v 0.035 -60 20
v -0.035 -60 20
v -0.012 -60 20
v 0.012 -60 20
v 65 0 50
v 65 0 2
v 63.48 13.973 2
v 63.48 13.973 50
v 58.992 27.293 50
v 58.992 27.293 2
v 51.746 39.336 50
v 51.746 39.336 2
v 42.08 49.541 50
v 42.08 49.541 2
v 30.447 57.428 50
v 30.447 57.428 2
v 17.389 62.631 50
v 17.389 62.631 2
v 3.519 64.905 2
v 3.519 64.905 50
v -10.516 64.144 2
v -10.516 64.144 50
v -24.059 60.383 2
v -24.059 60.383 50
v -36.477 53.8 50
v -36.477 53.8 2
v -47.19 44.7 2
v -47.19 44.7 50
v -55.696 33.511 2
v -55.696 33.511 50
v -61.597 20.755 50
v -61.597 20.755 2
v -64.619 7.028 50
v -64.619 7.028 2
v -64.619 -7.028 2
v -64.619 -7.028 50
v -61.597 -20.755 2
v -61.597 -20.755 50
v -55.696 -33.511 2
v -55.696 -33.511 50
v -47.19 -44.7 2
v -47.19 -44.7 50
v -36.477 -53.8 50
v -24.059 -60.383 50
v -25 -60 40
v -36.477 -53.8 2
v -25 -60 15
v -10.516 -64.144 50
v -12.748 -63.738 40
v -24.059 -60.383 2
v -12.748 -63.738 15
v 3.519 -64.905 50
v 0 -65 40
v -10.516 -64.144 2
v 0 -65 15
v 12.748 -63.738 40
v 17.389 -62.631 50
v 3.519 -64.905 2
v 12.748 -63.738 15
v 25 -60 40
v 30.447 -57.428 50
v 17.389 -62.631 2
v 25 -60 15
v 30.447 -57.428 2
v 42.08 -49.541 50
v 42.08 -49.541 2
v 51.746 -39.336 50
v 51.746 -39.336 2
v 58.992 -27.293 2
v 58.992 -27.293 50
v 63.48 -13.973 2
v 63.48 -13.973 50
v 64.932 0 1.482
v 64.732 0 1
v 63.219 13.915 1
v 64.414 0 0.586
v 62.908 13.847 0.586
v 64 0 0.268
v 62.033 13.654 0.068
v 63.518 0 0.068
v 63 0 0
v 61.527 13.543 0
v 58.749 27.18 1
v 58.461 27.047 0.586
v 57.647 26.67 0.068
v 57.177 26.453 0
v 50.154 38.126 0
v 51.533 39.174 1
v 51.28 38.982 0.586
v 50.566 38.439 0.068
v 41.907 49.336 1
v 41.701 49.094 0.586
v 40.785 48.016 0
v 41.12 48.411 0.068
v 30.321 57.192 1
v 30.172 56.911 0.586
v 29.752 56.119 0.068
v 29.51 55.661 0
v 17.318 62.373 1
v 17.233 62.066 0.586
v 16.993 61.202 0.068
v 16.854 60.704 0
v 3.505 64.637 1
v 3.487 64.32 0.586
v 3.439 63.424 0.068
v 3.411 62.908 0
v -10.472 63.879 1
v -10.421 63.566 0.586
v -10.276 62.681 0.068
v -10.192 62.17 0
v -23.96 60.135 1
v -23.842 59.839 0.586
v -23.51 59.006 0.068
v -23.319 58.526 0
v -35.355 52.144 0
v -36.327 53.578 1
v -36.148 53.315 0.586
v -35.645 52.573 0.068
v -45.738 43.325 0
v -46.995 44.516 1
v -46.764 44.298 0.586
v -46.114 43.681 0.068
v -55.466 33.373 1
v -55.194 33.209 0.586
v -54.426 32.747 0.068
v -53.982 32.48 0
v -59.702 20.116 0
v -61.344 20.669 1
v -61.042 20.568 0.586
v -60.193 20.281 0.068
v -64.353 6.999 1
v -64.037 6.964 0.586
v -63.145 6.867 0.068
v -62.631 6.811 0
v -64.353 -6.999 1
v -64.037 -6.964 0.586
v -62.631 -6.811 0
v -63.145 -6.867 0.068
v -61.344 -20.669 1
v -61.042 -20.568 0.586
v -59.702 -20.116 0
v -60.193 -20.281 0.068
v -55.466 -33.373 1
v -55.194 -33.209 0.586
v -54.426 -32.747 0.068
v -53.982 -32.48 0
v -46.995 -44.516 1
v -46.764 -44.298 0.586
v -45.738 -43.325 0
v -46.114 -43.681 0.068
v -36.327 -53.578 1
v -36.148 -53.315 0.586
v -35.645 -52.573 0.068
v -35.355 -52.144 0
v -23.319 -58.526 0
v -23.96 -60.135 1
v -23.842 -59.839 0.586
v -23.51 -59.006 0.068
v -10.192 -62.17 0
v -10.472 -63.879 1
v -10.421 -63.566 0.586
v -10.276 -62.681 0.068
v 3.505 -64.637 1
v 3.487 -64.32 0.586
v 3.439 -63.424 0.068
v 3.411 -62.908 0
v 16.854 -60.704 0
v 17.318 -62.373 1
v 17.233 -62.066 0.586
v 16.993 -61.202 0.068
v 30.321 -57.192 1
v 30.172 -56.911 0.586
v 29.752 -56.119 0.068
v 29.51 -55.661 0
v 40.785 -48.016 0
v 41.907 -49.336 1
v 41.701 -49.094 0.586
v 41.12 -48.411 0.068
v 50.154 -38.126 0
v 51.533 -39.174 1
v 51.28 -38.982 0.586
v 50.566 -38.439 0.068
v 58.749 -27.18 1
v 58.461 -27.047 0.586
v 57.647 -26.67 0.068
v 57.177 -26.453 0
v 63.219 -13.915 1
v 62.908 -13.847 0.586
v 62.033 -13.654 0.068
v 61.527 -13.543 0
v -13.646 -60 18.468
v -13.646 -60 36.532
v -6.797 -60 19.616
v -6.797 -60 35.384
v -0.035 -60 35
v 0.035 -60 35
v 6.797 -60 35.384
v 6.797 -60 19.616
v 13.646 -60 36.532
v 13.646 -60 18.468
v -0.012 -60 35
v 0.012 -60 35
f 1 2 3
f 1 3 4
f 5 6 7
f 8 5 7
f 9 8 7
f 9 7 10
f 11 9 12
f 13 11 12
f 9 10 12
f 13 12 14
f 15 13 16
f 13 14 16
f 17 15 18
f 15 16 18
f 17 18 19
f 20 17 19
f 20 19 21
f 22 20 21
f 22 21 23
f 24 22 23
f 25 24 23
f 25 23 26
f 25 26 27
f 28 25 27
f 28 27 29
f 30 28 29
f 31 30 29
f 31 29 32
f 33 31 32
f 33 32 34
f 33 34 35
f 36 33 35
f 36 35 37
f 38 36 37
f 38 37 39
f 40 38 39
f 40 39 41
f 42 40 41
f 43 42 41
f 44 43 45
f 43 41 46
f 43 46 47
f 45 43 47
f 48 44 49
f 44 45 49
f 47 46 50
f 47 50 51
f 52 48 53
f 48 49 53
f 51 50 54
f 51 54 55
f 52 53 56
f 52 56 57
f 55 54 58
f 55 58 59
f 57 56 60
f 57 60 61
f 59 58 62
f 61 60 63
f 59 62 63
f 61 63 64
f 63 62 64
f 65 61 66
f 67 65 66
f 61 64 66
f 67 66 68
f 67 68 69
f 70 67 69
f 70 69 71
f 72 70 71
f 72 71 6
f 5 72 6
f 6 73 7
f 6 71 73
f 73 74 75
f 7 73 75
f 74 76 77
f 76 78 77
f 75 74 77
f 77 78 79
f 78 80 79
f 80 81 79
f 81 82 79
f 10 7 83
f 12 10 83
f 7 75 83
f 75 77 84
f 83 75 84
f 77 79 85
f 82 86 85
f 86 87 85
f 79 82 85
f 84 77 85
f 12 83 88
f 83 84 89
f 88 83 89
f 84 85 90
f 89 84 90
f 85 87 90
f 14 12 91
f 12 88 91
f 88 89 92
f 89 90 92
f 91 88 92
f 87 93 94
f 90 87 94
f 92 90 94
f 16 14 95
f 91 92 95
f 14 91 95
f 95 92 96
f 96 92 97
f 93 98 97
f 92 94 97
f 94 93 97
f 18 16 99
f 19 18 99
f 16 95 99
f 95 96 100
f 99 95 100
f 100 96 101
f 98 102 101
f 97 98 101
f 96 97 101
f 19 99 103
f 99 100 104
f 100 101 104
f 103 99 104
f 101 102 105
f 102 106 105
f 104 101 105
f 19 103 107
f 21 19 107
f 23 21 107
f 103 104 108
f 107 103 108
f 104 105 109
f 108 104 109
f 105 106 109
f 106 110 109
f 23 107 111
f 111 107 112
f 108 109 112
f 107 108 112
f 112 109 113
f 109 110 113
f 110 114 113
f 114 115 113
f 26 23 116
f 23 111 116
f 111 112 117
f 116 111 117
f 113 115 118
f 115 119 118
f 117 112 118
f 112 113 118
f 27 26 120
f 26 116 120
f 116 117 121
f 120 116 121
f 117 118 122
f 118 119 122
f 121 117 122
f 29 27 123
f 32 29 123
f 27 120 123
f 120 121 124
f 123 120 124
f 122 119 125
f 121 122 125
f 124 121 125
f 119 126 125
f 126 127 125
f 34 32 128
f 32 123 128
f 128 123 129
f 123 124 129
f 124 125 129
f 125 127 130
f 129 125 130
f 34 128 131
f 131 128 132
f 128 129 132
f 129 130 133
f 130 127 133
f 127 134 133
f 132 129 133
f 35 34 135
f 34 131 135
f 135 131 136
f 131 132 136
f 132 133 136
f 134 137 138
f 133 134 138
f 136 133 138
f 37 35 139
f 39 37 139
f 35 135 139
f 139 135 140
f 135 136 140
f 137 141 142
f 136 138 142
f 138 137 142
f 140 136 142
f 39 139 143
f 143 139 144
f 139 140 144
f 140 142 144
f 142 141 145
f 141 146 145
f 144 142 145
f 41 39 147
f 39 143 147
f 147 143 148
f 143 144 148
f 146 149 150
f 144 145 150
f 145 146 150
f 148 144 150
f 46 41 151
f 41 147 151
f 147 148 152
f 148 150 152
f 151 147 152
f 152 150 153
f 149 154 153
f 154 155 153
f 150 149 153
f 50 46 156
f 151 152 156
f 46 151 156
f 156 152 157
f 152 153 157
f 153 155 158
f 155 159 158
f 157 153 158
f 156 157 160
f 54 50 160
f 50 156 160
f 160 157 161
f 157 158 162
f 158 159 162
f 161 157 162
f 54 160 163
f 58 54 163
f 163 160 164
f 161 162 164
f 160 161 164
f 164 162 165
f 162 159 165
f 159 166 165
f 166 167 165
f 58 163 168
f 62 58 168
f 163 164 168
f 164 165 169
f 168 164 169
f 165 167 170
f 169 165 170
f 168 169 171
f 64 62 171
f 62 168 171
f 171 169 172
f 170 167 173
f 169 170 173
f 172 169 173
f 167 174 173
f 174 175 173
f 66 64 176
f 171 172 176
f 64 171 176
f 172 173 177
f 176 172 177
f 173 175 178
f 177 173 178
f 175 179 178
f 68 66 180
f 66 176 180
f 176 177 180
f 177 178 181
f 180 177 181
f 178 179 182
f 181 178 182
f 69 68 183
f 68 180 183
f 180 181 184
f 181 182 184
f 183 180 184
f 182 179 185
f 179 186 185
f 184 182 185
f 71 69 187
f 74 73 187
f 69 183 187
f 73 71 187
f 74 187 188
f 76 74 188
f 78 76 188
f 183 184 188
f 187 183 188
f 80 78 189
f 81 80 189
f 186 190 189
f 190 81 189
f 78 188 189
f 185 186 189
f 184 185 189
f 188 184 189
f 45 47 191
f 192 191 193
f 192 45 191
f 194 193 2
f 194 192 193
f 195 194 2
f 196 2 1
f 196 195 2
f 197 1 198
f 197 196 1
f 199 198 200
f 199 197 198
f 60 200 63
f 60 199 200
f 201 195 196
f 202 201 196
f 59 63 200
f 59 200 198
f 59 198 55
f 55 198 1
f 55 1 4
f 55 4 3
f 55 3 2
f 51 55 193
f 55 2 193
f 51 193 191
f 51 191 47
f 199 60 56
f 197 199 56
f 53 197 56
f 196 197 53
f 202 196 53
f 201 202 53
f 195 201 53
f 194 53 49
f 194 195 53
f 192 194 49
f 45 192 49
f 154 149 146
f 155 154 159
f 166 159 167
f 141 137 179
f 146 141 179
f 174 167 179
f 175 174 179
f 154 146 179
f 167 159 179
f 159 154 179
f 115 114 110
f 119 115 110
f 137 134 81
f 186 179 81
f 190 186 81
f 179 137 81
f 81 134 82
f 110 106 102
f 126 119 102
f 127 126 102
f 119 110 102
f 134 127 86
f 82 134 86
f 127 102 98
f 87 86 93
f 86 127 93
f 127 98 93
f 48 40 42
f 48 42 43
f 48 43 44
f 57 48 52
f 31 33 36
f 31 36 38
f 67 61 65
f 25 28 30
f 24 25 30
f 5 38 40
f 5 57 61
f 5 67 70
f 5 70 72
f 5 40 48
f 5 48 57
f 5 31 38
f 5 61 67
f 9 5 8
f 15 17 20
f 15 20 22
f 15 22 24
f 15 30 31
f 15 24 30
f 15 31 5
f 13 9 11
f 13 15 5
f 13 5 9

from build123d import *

# Parameters (mm, degrees)
F0_R     = 65
F1_DEPTH = 50
F2_R     = 2
F4_W     = 50
F4_H     = 15
F5_DEPTH = 25
F6_SIZE  = 4.99999


# Not quite as in the source:
# - a fillet or chamfer is up to 0.001 mm smaller than in the source, because OpenCascade refuses the exact size


with BuildPart() as f1:
    # F0 (on Top) → F1 (new body)
    with BuildSketch(Plane.XY):
        Circle(F0_R)
    extrude(amount=F1_DEPTH)

    # F2
    f2_edges = [f1.edges().sort_by_distance(p)[0] for p in [
        (-65, 0, 0),
    ]]
    fillet(f2_edges, radius=F2_R)

    # F4 (on offset) → F5 (cut)
    with BuildSketch(Plane.XZ.offset(60)):
        with Locations((0, 27.5)):
            Rectangle(F4_W, F4_H)
    extrude(amount=F5_DEPTH, mode=Mode.SUBTRACT)

    # F6 (size 5 in the source; OpenCascade refuses exactly that, so slightly less here)
    f6_edges = [f1.edges().sort_by_distance(p)[0] for p in [
        (0, -65, 20),
        (0, -65, 35),
    ]]
    chamfer(f6_edges, length=F6_SIZE)


solid = f1.part
